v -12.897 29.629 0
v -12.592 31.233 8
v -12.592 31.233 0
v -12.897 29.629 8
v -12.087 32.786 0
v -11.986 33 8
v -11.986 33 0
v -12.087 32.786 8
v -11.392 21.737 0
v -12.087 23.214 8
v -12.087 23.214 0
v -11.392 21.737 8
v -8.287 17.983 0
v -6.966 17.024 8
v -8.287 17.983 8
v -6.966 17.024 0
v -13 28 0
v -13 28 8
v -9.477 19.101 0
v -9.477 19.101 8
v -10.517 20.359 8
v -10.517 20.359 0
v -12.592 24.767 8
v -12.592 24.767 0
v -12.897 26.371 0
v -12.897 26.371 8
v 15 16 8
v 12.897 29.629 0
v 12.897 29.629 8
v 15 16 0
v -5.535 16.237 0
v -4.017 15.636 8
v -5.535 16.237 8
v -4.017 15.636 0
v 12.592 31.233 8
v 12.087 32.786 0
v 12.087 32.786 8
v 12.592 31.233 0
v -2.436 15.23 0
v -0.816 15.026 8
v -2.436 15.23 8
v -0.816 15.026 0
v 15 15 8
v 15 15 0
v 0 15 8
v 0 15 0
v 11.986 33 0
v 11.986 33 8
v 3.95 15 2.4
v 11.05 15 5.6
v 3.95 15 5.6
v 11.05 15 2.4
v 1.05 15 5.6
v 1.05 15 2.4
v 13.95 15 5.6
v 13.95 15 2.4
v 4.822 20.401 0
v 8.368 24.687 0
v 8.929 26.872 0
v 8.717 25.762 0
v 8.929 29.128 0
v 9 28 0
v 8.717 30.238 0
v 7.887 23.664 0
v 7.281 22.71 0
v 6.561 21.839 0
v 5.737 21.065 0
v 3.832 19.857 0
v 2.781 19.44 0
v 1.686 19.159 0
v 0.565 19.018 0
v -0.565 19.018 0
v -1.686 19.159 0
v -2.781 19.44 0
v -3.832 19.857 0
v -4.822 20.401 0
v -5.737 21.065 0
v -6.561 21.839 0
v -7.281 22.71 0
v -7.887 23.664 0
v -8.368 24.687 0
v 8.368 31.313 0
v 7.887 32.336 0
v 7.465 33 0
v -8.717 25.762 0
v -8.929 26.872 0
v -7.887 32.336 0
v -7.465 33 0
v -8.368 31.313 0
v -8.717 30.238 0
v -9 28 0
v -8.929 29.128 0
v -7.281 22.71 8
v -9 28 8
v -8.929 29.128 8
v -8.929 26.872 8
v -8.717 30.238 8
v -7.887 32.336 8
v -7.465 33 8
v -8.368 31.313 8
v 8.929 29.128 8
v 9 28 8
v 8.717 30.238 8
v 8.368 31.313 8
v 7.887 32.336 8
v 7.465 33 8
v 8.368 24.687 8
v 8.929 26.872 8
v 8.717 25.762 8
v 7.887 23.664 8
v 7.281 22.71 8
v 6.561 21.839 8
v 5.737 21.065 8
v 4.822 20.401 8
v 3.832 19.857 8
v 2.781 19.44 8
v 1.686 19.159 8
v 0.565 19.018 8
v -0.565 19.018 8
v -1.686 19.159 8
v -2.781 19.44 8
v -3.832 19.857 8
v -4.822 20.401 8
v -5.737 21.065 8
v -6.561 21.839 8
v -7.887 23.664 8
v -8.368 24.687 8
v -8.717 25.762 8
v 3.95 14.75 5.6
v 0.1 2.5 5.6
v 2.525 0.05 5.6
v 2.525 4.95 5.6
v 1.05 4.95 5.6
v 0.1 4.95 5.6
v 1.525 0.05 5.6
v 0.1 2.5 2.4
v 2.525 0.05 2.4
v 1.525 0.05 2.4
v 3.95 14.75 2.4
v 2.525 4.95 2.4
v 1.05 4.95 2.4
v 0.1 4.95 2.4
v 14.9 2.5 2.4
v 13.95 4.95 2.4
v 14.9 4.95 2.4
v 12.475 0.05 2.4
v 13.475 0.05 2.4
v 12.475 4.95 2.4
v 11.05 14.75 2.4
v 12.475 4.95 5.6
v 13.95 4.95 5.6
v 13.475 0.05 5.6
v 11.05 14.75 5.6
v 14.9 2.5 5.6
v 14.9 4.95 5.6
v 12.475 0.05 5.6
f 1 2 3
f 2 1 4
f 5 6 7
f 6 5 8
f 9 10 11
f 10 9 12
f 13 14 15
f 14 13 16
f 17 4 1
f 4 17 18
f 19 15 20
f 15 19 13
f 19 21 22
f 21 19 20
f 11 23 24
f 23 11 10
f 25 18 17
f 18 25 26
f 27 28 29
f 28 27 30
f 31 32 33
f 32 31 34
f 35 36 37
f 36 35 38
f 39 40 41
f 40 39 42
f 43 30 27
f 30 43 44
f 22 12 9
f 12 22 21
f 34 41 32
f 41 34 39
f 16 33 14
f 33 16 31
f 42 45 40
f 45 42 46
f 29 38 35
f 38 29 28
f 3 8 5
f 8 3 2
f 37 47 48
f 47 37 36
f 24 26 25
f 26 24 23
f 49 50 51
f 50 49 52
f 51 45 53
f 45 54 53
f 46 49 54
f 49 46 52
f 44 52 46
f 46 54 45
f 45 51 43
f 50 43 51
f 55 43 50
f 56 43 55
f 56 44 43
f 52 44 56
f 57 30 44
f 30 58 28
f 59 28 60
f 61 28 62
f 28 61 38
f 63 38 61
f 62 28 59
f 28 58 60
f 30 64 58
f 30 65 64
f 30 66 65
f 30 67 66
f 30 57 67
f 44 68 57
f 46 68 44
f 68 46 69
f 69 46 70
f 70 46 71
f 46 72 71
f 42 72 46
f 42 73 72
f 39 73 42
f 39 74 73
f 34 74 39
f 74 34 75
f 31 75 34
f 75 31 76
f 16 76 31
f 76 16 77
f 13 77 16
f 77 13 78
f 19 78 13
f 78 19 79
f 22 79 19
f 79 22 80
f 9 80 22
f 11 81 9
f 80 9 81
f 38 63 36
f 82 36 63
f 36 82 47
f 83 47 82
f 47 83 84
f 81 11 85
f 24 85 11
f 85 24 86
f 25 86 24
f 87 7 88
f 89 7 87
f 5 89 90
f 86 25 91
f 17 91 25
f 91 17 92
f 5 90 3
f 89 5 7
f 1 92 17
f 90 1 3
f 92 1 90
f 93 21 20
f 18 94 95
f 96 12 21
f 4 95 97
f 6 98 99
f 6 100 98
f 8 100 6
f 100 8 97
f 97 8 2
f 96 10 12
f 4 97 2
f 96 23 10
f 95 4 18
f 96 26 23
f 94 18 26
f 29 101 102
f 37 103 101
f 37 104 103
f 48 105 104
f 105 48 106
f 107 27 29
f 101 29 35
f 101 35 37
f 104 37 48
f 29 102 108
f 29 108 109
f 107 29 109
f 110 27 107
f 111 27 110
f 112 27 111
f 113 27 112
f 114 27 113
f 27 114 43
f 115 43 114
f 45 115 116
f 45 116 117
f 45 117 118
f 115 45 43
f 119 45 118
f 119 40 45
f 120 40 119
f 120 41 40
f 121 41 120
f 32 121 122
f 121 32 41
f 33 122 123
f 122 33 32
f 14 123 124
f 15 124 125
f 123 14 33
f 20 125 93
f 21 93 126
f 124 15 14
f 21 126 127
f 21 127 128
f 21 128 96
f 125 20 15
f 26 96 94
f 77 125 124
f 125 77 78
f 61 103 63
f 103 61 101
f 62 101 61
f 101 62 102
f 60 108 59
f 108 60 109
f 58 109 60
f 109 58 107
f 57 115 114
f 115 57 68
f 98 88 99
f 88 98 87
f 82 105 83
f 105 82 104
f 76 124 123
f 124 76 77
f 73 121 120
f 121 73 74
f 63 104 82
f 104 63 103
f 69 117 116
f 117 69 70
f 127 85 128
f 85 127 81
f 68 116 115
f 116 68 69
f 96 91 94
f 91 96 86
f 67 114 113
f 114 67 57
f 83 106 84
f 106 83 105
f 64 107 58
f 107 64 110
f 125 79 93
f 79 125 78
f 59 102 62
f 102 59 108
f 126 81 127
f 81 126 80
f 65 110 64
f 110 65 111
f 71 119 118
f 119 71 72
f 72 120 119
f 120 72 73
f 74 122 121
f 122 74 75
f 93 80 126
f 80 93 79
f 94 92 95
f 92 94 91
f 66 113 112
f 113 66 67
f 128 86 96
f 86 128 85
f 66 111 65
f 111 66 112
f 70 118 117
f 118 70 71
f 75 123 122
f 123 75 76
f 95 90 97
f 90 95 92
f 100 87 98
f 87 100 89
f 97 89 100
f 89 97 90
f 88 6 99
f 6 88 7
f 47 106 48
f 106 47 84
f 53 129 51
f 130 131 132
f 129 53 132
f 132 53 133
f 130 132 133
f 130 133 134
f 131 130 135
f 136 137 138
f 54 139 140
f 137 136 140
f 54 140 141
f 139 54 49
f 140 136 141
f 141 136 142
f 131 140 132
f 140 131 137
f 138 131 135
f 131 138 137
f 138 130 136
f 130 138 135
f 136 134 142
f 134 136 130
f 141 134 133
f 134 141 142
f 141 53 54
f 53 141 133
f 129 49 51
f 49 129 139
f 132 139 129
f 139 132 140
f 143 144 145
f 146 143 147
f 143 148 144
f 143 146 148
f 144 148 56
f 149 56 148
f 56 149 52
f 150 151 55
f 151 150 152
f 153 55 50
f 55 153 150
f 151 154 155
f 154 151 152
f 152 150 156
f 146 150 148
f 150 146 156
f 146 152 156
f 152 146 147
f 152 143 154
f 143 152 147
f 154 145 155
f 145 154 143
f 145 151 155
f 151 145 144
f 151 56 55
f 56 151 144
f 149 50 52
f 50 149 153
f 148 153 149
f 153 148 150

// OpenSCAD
// file: clip.scad
module clip(
	width, length, tickness, 
	teeth_height, teeth_length, 
	backlash=0.1, vbacklash=0.4
) 
{
	bl = backlash / 2;
	w = width - 2 * bl;
	l = length - bl ;
	th =teeth_height -bl;
	tl = teeth_length -2*bl;

	assert( w > teeth_height*2, "Clip tooth too high");
	assert(l > teeth_length, "Clip tooth too long");

	translate([0, bl, vbacklash])
	linear_extrude(tickness - 2*vbacklash)
	polygon([
		[0, 0],
		[0, w],
		[l - tl, w],
		[l - tl, w + th],
		[l - tl/2, w + th],
		[l, w - th/2],
		[l, 1.5* th],
		[l - tl, 1.5*th],
		[l - 3*tl, 0]
	]);

}


module clip_pocket(
	width, length, tickness, 
	teeth_height, teeth_length,
	backlash=0.1, vbacklash=0.4
)  {

	bl = backlash / 2;
	w = width + 2 * bl;
	l = length + bl ;
	th =teeth_height +bl;
	tl = teeth_length +2*bl;

	translate([0, -bl, -vbacklash])
	linear_extrude(tickness+ 2*vbacklash)
	polygon([
		[0, 0],
		[0, w],
		[l - tl, w],
		[l - tl, w + th],
		[l, w + th],
		[l , 0]
	]);

	
}

difference(){
	translate([0, -1, -1])
	cube([20, 8, 2.9]);

	clip_pocket(5, 15, 3, 1, 3);

}

color("red")
clip(5, 15, 3, 1, 3);
// file: dovetail.scad
/**
    blind dovetail 
    
    http://www.craftsmanspace.com/knowledge/dovetail-woodworking-joints.html
*/

l = 25;
b = 10;
h = 50;

hiddenThickness  = 2;
tailLength = b; // vergissing mijnerzeids, moet gelijk zijn natuurlijk
margin     = 0.2; // marging between pins and tail
angle = 75;  // 90 degrees is no dovetail.
             // hardwood 8:1 = 83 degrees. Softwoord 6:1 = 80 degrees
minimumGap  =  5;  // minimum room between tails

//calculate the number of tails
tails = getTails();
gap = getGap(tails);
echo(tails=tails, gap=gap);

color("green") tailBoard();
//color("red")   pinBoard();


module tailBoard(hidden = true) {
    union() {
        translate([tailLength, 0, 0])
            cube([l - tailLength, b, h]);
        pins(false, true);
    } 
}

module pinBoard(hidden = true) {
    difference() {
        translate([b, 0, 0])
            rotate([0, 0, 90])
                cube([l,b,h]);
        pins(true, true);
    }
}


module pin(cutOut) {
    
    m = cutOut ? margin : -margin;
    w = tailLength;    // width of pin
    tX = 0;   // translate x
    
    x = tailLength / tan(angle);
    p1 = [-x - m, 0];
    p2 = [-m, tailLength];
    p3 = [gap + m, tailLength];
    p4 = [gap + x + m, 0];
    
    p=[p1, p2, p3, p4];
    translate([tX, b, gap / 2])
    rotate([0, 90, -90])
    linear_extrude(height = b)
    polygon(p);
}

module pins(cutOut, hidden = true) {
    
    start = tailHeight(gap) / 2;
    height = 2 * start;
    union() {
        for (i = [0:tails - 1]) {
            translate([0, 0, start + i*height])
            pin(cutOut);
        }
        if (hidden) {
            cube([tailLength,hiddenThickness,h]);
        }
    }
}

//!halfPin(true, true);
module halfPin(top, cutOut) {
    c = [b*2, b*2, b];
    t = top ? [-b/2,-b/2, 0] : [-b/2, -b/2, -b];
    tc = top ? [0, 0, h] : [0, 0, 0];
    echo(top=top,t=t);
    translate(tc)
    difference() {
        pin(cutOut);
        translate(t)
            #cube(c);
    }
    
}


function getTails() = floor(h / tailHeight(minimumGap));
function getGap(tails)   = angle == 90 
                                ? h/(2 * tails)
                                : h/(2 * tails) - tailLength / tan(angle);  
function tailHeight(gap) = angle == 90 
                                ? gap 
                                : 2 * (tailLength / tan(angle) + gap);
// file: mounting_plate.scad
module flat_head_screw(d, h) {   
    d = d/2;
    //Hole
    translate([0, 0, -(h+d+0.1)])
    cylinder(h+0.2, d, d); 
    //head
    translate([0, 0, -d])
    cylinder(d+0.1, d, 2*(d+0.2));
}

module mounting_plate(hole_pos, thikness, hole_diam, offset)
{
    difference()
    {
        hull()
        {
            for(p=hole_pos)
            {
                translate(p)
                cylinder(h=thikness, r=offset);
            }
        }
        for(p=hole_pos)
        {
            translate(concat(p, thikness))
                flat_head_screw(hole_diam, thikness);
        }
    }
}

mounting_plate([[50,10], [20,60], [5,10]], 5, 4, 8);
// main file
$fn=50;

use <mounting_plate.scad>;
use <dovetail.scad>;
use <clip.scad>;



// Depth to the ski slot
ski_slot_depth = 130;


// Finger width
finger_width = 15;

tickness = 8;


holder_width =  2 * finger_width;
holder_depth = ski_slot_depth + tickness;


// Mounting holde diameter
mh_d = 4.2;

// Mounting hole offset
mh_offset = 15;

// Corner radius
r=5; // [1:10]

// Ski-pole diameter
pole_diam=18;
// Ski-pole holder diameter
pole_holder_tickness=4;

chamf_diam=6;



module base_plate()
{
    translate([-0,- tickness, 0])
        rotate([-90,0,0])
            mounting_plate(
                [
                    [finger_width/2, -mh_offset-tickness],
                    [finger_width/2, holder_depth/2+mh_offset],
                    // Side hole
                    [-mh_offset, -tickness/2]
                ],
                tickness,
                mh_d,
                finger_width/2
            );
}

module chanfin(r, l, angle)
{
    s= r/sin(angle);
    y = r*cos(angle/2);
    x= y /tan(angle/2);
    linear_extrude(l)
    rotate([0, 0, angle/2])
    difference()
    {
        
        polygon([
            [0, 0],
            [x, y],
            [x, -y],
        ]);
        translate([r/sin(angle/2), 0, 0])
            circle(r=r);
    }
}

module tooth(w, h, d, offset) {
    hull() 
    {
        cube([w, h, 0.1]);
        translate([offset/2, offset/2, 0])
            cube([w-offset, h-offset, d]);
    }   
}

teeth_depth = tickness/2;
teeth_width = 2;

// 1 Finger
module finger()
{
    difference() {
        union()
        {
    
            // Finger
            cube([finger_width, holder_depth, tickness]);
    
            // base chanfins
            rotate([0, 90, 0])
                chanfin(chamf_diam, finger_width, 90);
            translate([0, 0, tickness])
                rotate([0, 90, 0])rotate([0, 0, 90])
                    chanfin(chamf_diam, finger_width, 90);
        }
    
        // Two Clip slots
        translate([4, holder_depth, 3*tickness/4])
            rotate([180, 0,-90])
                clip_pocket(3, 15, tickness/2, 1, 5);

        translate([finger_width-tickness/4-teeth_width, holder_depth, tickness/4])
            rotate([0, 0,-90])
                clip_pocket(3, 15, tickness/2, 1, 5);
    }       
}

// Ski pole holder
module pole_holder()
{

    difference() 
    {
        hull()
        {
            cube([finger_width, 1, tickness]);
                translate([0, (pole_diam+2*pole_holder_tickness)/2, 0])
            cylinder(tickness, d=pole_diam+2*pole_holder_tickness);
        }
        
        // Slot for the pole
        translate([0, (pole_diam+2*pole_holder_tickness)/2, -1])
            cylinder(tickness+2, d=pole_diam);
        
        // Front opening
        translate([-(pole_diam+2*pole_holder_tickness)/2, (pole_diam+2*pole_holder_tickness)/2+5,-1])
            cube([pole_diam+2*pole_holder_tickness, pole_diam+2*pole_holder_tickness, tickness+2]);

 
        
    }

    translate([4, 0, 3/4*tickness])
        rotate([180, 0,-90])
            clip(3, 15, tickness/2, 1, 5);
    translate([finger_width-tickness/4- teeth_width, 0, tickness/4])
        rotate([0, 0,-90])
            clip(3, 15, tickness/2, 1, 5);
 
}


// Under support base
module support()
{
    union()
    {
        hull()
        {
            translate([0, holder_depth/2-tickness, 0])
                cube([finger_width, sqrt(2)*tickness,0.1]);

            translate([0, 0, -holder_depth/2+tickness, ])
                rotate([-90, 0, 0])
                    cube([finger_width, sqrt(2)*tickness, 0.1]);
        }
        translate([0, holder_depth/2-tickness, 0])
            rotate([0, 90, 0]) rotate([0, 0, -90])
                chanfin(chamf_diam, finger_width, 45);

        translate([0, 0, -holder_depth/2+tickness])
            rotate([0, 90, 0]) rotate([0, 0, 180-45])
                chanfin(chamf_diam, finger_width, 45);

        translate([0, holder_depth/2-tickness+sqrt(2)*tickness, 0])
            rotate([0, 90, 0]) rotate([0, 0, -45])
                chanfin(chamf_diam, finger_width, 135);


        translate([0, 0, -holder_depth/2+tickness-sqrt(2)*tickness ])
            rotate([0, 90, 0]) rotate([0, 0, 0])
                chanfin(chamf_diam, finger_width, 135);
    }
}

// Right half of ski-holder
module half_holder()
{
    union()
    {          
        support();
        
        finger();
  
        *translate([0, holder_depth,  0])
        {
            pole_holder();
        }
        base_plate();
    }
}


// Right ski-holder

*half_holder();

translate([0, -holder_depth, 0]) {
    *difference() {
        finger();
        translate([-50, 0, -50])
            cube(size=[100, 110, 100], center=false);
    }
    translate([0, holder_depth+15,  0])
        pole_holder();
}

// Left ski-holder
*translate([60,0,0])
    mirror([1, 0, 0])
    {
        half_holder();
        translate([0, holder_depth,  0])
            pole_holder();
    }
